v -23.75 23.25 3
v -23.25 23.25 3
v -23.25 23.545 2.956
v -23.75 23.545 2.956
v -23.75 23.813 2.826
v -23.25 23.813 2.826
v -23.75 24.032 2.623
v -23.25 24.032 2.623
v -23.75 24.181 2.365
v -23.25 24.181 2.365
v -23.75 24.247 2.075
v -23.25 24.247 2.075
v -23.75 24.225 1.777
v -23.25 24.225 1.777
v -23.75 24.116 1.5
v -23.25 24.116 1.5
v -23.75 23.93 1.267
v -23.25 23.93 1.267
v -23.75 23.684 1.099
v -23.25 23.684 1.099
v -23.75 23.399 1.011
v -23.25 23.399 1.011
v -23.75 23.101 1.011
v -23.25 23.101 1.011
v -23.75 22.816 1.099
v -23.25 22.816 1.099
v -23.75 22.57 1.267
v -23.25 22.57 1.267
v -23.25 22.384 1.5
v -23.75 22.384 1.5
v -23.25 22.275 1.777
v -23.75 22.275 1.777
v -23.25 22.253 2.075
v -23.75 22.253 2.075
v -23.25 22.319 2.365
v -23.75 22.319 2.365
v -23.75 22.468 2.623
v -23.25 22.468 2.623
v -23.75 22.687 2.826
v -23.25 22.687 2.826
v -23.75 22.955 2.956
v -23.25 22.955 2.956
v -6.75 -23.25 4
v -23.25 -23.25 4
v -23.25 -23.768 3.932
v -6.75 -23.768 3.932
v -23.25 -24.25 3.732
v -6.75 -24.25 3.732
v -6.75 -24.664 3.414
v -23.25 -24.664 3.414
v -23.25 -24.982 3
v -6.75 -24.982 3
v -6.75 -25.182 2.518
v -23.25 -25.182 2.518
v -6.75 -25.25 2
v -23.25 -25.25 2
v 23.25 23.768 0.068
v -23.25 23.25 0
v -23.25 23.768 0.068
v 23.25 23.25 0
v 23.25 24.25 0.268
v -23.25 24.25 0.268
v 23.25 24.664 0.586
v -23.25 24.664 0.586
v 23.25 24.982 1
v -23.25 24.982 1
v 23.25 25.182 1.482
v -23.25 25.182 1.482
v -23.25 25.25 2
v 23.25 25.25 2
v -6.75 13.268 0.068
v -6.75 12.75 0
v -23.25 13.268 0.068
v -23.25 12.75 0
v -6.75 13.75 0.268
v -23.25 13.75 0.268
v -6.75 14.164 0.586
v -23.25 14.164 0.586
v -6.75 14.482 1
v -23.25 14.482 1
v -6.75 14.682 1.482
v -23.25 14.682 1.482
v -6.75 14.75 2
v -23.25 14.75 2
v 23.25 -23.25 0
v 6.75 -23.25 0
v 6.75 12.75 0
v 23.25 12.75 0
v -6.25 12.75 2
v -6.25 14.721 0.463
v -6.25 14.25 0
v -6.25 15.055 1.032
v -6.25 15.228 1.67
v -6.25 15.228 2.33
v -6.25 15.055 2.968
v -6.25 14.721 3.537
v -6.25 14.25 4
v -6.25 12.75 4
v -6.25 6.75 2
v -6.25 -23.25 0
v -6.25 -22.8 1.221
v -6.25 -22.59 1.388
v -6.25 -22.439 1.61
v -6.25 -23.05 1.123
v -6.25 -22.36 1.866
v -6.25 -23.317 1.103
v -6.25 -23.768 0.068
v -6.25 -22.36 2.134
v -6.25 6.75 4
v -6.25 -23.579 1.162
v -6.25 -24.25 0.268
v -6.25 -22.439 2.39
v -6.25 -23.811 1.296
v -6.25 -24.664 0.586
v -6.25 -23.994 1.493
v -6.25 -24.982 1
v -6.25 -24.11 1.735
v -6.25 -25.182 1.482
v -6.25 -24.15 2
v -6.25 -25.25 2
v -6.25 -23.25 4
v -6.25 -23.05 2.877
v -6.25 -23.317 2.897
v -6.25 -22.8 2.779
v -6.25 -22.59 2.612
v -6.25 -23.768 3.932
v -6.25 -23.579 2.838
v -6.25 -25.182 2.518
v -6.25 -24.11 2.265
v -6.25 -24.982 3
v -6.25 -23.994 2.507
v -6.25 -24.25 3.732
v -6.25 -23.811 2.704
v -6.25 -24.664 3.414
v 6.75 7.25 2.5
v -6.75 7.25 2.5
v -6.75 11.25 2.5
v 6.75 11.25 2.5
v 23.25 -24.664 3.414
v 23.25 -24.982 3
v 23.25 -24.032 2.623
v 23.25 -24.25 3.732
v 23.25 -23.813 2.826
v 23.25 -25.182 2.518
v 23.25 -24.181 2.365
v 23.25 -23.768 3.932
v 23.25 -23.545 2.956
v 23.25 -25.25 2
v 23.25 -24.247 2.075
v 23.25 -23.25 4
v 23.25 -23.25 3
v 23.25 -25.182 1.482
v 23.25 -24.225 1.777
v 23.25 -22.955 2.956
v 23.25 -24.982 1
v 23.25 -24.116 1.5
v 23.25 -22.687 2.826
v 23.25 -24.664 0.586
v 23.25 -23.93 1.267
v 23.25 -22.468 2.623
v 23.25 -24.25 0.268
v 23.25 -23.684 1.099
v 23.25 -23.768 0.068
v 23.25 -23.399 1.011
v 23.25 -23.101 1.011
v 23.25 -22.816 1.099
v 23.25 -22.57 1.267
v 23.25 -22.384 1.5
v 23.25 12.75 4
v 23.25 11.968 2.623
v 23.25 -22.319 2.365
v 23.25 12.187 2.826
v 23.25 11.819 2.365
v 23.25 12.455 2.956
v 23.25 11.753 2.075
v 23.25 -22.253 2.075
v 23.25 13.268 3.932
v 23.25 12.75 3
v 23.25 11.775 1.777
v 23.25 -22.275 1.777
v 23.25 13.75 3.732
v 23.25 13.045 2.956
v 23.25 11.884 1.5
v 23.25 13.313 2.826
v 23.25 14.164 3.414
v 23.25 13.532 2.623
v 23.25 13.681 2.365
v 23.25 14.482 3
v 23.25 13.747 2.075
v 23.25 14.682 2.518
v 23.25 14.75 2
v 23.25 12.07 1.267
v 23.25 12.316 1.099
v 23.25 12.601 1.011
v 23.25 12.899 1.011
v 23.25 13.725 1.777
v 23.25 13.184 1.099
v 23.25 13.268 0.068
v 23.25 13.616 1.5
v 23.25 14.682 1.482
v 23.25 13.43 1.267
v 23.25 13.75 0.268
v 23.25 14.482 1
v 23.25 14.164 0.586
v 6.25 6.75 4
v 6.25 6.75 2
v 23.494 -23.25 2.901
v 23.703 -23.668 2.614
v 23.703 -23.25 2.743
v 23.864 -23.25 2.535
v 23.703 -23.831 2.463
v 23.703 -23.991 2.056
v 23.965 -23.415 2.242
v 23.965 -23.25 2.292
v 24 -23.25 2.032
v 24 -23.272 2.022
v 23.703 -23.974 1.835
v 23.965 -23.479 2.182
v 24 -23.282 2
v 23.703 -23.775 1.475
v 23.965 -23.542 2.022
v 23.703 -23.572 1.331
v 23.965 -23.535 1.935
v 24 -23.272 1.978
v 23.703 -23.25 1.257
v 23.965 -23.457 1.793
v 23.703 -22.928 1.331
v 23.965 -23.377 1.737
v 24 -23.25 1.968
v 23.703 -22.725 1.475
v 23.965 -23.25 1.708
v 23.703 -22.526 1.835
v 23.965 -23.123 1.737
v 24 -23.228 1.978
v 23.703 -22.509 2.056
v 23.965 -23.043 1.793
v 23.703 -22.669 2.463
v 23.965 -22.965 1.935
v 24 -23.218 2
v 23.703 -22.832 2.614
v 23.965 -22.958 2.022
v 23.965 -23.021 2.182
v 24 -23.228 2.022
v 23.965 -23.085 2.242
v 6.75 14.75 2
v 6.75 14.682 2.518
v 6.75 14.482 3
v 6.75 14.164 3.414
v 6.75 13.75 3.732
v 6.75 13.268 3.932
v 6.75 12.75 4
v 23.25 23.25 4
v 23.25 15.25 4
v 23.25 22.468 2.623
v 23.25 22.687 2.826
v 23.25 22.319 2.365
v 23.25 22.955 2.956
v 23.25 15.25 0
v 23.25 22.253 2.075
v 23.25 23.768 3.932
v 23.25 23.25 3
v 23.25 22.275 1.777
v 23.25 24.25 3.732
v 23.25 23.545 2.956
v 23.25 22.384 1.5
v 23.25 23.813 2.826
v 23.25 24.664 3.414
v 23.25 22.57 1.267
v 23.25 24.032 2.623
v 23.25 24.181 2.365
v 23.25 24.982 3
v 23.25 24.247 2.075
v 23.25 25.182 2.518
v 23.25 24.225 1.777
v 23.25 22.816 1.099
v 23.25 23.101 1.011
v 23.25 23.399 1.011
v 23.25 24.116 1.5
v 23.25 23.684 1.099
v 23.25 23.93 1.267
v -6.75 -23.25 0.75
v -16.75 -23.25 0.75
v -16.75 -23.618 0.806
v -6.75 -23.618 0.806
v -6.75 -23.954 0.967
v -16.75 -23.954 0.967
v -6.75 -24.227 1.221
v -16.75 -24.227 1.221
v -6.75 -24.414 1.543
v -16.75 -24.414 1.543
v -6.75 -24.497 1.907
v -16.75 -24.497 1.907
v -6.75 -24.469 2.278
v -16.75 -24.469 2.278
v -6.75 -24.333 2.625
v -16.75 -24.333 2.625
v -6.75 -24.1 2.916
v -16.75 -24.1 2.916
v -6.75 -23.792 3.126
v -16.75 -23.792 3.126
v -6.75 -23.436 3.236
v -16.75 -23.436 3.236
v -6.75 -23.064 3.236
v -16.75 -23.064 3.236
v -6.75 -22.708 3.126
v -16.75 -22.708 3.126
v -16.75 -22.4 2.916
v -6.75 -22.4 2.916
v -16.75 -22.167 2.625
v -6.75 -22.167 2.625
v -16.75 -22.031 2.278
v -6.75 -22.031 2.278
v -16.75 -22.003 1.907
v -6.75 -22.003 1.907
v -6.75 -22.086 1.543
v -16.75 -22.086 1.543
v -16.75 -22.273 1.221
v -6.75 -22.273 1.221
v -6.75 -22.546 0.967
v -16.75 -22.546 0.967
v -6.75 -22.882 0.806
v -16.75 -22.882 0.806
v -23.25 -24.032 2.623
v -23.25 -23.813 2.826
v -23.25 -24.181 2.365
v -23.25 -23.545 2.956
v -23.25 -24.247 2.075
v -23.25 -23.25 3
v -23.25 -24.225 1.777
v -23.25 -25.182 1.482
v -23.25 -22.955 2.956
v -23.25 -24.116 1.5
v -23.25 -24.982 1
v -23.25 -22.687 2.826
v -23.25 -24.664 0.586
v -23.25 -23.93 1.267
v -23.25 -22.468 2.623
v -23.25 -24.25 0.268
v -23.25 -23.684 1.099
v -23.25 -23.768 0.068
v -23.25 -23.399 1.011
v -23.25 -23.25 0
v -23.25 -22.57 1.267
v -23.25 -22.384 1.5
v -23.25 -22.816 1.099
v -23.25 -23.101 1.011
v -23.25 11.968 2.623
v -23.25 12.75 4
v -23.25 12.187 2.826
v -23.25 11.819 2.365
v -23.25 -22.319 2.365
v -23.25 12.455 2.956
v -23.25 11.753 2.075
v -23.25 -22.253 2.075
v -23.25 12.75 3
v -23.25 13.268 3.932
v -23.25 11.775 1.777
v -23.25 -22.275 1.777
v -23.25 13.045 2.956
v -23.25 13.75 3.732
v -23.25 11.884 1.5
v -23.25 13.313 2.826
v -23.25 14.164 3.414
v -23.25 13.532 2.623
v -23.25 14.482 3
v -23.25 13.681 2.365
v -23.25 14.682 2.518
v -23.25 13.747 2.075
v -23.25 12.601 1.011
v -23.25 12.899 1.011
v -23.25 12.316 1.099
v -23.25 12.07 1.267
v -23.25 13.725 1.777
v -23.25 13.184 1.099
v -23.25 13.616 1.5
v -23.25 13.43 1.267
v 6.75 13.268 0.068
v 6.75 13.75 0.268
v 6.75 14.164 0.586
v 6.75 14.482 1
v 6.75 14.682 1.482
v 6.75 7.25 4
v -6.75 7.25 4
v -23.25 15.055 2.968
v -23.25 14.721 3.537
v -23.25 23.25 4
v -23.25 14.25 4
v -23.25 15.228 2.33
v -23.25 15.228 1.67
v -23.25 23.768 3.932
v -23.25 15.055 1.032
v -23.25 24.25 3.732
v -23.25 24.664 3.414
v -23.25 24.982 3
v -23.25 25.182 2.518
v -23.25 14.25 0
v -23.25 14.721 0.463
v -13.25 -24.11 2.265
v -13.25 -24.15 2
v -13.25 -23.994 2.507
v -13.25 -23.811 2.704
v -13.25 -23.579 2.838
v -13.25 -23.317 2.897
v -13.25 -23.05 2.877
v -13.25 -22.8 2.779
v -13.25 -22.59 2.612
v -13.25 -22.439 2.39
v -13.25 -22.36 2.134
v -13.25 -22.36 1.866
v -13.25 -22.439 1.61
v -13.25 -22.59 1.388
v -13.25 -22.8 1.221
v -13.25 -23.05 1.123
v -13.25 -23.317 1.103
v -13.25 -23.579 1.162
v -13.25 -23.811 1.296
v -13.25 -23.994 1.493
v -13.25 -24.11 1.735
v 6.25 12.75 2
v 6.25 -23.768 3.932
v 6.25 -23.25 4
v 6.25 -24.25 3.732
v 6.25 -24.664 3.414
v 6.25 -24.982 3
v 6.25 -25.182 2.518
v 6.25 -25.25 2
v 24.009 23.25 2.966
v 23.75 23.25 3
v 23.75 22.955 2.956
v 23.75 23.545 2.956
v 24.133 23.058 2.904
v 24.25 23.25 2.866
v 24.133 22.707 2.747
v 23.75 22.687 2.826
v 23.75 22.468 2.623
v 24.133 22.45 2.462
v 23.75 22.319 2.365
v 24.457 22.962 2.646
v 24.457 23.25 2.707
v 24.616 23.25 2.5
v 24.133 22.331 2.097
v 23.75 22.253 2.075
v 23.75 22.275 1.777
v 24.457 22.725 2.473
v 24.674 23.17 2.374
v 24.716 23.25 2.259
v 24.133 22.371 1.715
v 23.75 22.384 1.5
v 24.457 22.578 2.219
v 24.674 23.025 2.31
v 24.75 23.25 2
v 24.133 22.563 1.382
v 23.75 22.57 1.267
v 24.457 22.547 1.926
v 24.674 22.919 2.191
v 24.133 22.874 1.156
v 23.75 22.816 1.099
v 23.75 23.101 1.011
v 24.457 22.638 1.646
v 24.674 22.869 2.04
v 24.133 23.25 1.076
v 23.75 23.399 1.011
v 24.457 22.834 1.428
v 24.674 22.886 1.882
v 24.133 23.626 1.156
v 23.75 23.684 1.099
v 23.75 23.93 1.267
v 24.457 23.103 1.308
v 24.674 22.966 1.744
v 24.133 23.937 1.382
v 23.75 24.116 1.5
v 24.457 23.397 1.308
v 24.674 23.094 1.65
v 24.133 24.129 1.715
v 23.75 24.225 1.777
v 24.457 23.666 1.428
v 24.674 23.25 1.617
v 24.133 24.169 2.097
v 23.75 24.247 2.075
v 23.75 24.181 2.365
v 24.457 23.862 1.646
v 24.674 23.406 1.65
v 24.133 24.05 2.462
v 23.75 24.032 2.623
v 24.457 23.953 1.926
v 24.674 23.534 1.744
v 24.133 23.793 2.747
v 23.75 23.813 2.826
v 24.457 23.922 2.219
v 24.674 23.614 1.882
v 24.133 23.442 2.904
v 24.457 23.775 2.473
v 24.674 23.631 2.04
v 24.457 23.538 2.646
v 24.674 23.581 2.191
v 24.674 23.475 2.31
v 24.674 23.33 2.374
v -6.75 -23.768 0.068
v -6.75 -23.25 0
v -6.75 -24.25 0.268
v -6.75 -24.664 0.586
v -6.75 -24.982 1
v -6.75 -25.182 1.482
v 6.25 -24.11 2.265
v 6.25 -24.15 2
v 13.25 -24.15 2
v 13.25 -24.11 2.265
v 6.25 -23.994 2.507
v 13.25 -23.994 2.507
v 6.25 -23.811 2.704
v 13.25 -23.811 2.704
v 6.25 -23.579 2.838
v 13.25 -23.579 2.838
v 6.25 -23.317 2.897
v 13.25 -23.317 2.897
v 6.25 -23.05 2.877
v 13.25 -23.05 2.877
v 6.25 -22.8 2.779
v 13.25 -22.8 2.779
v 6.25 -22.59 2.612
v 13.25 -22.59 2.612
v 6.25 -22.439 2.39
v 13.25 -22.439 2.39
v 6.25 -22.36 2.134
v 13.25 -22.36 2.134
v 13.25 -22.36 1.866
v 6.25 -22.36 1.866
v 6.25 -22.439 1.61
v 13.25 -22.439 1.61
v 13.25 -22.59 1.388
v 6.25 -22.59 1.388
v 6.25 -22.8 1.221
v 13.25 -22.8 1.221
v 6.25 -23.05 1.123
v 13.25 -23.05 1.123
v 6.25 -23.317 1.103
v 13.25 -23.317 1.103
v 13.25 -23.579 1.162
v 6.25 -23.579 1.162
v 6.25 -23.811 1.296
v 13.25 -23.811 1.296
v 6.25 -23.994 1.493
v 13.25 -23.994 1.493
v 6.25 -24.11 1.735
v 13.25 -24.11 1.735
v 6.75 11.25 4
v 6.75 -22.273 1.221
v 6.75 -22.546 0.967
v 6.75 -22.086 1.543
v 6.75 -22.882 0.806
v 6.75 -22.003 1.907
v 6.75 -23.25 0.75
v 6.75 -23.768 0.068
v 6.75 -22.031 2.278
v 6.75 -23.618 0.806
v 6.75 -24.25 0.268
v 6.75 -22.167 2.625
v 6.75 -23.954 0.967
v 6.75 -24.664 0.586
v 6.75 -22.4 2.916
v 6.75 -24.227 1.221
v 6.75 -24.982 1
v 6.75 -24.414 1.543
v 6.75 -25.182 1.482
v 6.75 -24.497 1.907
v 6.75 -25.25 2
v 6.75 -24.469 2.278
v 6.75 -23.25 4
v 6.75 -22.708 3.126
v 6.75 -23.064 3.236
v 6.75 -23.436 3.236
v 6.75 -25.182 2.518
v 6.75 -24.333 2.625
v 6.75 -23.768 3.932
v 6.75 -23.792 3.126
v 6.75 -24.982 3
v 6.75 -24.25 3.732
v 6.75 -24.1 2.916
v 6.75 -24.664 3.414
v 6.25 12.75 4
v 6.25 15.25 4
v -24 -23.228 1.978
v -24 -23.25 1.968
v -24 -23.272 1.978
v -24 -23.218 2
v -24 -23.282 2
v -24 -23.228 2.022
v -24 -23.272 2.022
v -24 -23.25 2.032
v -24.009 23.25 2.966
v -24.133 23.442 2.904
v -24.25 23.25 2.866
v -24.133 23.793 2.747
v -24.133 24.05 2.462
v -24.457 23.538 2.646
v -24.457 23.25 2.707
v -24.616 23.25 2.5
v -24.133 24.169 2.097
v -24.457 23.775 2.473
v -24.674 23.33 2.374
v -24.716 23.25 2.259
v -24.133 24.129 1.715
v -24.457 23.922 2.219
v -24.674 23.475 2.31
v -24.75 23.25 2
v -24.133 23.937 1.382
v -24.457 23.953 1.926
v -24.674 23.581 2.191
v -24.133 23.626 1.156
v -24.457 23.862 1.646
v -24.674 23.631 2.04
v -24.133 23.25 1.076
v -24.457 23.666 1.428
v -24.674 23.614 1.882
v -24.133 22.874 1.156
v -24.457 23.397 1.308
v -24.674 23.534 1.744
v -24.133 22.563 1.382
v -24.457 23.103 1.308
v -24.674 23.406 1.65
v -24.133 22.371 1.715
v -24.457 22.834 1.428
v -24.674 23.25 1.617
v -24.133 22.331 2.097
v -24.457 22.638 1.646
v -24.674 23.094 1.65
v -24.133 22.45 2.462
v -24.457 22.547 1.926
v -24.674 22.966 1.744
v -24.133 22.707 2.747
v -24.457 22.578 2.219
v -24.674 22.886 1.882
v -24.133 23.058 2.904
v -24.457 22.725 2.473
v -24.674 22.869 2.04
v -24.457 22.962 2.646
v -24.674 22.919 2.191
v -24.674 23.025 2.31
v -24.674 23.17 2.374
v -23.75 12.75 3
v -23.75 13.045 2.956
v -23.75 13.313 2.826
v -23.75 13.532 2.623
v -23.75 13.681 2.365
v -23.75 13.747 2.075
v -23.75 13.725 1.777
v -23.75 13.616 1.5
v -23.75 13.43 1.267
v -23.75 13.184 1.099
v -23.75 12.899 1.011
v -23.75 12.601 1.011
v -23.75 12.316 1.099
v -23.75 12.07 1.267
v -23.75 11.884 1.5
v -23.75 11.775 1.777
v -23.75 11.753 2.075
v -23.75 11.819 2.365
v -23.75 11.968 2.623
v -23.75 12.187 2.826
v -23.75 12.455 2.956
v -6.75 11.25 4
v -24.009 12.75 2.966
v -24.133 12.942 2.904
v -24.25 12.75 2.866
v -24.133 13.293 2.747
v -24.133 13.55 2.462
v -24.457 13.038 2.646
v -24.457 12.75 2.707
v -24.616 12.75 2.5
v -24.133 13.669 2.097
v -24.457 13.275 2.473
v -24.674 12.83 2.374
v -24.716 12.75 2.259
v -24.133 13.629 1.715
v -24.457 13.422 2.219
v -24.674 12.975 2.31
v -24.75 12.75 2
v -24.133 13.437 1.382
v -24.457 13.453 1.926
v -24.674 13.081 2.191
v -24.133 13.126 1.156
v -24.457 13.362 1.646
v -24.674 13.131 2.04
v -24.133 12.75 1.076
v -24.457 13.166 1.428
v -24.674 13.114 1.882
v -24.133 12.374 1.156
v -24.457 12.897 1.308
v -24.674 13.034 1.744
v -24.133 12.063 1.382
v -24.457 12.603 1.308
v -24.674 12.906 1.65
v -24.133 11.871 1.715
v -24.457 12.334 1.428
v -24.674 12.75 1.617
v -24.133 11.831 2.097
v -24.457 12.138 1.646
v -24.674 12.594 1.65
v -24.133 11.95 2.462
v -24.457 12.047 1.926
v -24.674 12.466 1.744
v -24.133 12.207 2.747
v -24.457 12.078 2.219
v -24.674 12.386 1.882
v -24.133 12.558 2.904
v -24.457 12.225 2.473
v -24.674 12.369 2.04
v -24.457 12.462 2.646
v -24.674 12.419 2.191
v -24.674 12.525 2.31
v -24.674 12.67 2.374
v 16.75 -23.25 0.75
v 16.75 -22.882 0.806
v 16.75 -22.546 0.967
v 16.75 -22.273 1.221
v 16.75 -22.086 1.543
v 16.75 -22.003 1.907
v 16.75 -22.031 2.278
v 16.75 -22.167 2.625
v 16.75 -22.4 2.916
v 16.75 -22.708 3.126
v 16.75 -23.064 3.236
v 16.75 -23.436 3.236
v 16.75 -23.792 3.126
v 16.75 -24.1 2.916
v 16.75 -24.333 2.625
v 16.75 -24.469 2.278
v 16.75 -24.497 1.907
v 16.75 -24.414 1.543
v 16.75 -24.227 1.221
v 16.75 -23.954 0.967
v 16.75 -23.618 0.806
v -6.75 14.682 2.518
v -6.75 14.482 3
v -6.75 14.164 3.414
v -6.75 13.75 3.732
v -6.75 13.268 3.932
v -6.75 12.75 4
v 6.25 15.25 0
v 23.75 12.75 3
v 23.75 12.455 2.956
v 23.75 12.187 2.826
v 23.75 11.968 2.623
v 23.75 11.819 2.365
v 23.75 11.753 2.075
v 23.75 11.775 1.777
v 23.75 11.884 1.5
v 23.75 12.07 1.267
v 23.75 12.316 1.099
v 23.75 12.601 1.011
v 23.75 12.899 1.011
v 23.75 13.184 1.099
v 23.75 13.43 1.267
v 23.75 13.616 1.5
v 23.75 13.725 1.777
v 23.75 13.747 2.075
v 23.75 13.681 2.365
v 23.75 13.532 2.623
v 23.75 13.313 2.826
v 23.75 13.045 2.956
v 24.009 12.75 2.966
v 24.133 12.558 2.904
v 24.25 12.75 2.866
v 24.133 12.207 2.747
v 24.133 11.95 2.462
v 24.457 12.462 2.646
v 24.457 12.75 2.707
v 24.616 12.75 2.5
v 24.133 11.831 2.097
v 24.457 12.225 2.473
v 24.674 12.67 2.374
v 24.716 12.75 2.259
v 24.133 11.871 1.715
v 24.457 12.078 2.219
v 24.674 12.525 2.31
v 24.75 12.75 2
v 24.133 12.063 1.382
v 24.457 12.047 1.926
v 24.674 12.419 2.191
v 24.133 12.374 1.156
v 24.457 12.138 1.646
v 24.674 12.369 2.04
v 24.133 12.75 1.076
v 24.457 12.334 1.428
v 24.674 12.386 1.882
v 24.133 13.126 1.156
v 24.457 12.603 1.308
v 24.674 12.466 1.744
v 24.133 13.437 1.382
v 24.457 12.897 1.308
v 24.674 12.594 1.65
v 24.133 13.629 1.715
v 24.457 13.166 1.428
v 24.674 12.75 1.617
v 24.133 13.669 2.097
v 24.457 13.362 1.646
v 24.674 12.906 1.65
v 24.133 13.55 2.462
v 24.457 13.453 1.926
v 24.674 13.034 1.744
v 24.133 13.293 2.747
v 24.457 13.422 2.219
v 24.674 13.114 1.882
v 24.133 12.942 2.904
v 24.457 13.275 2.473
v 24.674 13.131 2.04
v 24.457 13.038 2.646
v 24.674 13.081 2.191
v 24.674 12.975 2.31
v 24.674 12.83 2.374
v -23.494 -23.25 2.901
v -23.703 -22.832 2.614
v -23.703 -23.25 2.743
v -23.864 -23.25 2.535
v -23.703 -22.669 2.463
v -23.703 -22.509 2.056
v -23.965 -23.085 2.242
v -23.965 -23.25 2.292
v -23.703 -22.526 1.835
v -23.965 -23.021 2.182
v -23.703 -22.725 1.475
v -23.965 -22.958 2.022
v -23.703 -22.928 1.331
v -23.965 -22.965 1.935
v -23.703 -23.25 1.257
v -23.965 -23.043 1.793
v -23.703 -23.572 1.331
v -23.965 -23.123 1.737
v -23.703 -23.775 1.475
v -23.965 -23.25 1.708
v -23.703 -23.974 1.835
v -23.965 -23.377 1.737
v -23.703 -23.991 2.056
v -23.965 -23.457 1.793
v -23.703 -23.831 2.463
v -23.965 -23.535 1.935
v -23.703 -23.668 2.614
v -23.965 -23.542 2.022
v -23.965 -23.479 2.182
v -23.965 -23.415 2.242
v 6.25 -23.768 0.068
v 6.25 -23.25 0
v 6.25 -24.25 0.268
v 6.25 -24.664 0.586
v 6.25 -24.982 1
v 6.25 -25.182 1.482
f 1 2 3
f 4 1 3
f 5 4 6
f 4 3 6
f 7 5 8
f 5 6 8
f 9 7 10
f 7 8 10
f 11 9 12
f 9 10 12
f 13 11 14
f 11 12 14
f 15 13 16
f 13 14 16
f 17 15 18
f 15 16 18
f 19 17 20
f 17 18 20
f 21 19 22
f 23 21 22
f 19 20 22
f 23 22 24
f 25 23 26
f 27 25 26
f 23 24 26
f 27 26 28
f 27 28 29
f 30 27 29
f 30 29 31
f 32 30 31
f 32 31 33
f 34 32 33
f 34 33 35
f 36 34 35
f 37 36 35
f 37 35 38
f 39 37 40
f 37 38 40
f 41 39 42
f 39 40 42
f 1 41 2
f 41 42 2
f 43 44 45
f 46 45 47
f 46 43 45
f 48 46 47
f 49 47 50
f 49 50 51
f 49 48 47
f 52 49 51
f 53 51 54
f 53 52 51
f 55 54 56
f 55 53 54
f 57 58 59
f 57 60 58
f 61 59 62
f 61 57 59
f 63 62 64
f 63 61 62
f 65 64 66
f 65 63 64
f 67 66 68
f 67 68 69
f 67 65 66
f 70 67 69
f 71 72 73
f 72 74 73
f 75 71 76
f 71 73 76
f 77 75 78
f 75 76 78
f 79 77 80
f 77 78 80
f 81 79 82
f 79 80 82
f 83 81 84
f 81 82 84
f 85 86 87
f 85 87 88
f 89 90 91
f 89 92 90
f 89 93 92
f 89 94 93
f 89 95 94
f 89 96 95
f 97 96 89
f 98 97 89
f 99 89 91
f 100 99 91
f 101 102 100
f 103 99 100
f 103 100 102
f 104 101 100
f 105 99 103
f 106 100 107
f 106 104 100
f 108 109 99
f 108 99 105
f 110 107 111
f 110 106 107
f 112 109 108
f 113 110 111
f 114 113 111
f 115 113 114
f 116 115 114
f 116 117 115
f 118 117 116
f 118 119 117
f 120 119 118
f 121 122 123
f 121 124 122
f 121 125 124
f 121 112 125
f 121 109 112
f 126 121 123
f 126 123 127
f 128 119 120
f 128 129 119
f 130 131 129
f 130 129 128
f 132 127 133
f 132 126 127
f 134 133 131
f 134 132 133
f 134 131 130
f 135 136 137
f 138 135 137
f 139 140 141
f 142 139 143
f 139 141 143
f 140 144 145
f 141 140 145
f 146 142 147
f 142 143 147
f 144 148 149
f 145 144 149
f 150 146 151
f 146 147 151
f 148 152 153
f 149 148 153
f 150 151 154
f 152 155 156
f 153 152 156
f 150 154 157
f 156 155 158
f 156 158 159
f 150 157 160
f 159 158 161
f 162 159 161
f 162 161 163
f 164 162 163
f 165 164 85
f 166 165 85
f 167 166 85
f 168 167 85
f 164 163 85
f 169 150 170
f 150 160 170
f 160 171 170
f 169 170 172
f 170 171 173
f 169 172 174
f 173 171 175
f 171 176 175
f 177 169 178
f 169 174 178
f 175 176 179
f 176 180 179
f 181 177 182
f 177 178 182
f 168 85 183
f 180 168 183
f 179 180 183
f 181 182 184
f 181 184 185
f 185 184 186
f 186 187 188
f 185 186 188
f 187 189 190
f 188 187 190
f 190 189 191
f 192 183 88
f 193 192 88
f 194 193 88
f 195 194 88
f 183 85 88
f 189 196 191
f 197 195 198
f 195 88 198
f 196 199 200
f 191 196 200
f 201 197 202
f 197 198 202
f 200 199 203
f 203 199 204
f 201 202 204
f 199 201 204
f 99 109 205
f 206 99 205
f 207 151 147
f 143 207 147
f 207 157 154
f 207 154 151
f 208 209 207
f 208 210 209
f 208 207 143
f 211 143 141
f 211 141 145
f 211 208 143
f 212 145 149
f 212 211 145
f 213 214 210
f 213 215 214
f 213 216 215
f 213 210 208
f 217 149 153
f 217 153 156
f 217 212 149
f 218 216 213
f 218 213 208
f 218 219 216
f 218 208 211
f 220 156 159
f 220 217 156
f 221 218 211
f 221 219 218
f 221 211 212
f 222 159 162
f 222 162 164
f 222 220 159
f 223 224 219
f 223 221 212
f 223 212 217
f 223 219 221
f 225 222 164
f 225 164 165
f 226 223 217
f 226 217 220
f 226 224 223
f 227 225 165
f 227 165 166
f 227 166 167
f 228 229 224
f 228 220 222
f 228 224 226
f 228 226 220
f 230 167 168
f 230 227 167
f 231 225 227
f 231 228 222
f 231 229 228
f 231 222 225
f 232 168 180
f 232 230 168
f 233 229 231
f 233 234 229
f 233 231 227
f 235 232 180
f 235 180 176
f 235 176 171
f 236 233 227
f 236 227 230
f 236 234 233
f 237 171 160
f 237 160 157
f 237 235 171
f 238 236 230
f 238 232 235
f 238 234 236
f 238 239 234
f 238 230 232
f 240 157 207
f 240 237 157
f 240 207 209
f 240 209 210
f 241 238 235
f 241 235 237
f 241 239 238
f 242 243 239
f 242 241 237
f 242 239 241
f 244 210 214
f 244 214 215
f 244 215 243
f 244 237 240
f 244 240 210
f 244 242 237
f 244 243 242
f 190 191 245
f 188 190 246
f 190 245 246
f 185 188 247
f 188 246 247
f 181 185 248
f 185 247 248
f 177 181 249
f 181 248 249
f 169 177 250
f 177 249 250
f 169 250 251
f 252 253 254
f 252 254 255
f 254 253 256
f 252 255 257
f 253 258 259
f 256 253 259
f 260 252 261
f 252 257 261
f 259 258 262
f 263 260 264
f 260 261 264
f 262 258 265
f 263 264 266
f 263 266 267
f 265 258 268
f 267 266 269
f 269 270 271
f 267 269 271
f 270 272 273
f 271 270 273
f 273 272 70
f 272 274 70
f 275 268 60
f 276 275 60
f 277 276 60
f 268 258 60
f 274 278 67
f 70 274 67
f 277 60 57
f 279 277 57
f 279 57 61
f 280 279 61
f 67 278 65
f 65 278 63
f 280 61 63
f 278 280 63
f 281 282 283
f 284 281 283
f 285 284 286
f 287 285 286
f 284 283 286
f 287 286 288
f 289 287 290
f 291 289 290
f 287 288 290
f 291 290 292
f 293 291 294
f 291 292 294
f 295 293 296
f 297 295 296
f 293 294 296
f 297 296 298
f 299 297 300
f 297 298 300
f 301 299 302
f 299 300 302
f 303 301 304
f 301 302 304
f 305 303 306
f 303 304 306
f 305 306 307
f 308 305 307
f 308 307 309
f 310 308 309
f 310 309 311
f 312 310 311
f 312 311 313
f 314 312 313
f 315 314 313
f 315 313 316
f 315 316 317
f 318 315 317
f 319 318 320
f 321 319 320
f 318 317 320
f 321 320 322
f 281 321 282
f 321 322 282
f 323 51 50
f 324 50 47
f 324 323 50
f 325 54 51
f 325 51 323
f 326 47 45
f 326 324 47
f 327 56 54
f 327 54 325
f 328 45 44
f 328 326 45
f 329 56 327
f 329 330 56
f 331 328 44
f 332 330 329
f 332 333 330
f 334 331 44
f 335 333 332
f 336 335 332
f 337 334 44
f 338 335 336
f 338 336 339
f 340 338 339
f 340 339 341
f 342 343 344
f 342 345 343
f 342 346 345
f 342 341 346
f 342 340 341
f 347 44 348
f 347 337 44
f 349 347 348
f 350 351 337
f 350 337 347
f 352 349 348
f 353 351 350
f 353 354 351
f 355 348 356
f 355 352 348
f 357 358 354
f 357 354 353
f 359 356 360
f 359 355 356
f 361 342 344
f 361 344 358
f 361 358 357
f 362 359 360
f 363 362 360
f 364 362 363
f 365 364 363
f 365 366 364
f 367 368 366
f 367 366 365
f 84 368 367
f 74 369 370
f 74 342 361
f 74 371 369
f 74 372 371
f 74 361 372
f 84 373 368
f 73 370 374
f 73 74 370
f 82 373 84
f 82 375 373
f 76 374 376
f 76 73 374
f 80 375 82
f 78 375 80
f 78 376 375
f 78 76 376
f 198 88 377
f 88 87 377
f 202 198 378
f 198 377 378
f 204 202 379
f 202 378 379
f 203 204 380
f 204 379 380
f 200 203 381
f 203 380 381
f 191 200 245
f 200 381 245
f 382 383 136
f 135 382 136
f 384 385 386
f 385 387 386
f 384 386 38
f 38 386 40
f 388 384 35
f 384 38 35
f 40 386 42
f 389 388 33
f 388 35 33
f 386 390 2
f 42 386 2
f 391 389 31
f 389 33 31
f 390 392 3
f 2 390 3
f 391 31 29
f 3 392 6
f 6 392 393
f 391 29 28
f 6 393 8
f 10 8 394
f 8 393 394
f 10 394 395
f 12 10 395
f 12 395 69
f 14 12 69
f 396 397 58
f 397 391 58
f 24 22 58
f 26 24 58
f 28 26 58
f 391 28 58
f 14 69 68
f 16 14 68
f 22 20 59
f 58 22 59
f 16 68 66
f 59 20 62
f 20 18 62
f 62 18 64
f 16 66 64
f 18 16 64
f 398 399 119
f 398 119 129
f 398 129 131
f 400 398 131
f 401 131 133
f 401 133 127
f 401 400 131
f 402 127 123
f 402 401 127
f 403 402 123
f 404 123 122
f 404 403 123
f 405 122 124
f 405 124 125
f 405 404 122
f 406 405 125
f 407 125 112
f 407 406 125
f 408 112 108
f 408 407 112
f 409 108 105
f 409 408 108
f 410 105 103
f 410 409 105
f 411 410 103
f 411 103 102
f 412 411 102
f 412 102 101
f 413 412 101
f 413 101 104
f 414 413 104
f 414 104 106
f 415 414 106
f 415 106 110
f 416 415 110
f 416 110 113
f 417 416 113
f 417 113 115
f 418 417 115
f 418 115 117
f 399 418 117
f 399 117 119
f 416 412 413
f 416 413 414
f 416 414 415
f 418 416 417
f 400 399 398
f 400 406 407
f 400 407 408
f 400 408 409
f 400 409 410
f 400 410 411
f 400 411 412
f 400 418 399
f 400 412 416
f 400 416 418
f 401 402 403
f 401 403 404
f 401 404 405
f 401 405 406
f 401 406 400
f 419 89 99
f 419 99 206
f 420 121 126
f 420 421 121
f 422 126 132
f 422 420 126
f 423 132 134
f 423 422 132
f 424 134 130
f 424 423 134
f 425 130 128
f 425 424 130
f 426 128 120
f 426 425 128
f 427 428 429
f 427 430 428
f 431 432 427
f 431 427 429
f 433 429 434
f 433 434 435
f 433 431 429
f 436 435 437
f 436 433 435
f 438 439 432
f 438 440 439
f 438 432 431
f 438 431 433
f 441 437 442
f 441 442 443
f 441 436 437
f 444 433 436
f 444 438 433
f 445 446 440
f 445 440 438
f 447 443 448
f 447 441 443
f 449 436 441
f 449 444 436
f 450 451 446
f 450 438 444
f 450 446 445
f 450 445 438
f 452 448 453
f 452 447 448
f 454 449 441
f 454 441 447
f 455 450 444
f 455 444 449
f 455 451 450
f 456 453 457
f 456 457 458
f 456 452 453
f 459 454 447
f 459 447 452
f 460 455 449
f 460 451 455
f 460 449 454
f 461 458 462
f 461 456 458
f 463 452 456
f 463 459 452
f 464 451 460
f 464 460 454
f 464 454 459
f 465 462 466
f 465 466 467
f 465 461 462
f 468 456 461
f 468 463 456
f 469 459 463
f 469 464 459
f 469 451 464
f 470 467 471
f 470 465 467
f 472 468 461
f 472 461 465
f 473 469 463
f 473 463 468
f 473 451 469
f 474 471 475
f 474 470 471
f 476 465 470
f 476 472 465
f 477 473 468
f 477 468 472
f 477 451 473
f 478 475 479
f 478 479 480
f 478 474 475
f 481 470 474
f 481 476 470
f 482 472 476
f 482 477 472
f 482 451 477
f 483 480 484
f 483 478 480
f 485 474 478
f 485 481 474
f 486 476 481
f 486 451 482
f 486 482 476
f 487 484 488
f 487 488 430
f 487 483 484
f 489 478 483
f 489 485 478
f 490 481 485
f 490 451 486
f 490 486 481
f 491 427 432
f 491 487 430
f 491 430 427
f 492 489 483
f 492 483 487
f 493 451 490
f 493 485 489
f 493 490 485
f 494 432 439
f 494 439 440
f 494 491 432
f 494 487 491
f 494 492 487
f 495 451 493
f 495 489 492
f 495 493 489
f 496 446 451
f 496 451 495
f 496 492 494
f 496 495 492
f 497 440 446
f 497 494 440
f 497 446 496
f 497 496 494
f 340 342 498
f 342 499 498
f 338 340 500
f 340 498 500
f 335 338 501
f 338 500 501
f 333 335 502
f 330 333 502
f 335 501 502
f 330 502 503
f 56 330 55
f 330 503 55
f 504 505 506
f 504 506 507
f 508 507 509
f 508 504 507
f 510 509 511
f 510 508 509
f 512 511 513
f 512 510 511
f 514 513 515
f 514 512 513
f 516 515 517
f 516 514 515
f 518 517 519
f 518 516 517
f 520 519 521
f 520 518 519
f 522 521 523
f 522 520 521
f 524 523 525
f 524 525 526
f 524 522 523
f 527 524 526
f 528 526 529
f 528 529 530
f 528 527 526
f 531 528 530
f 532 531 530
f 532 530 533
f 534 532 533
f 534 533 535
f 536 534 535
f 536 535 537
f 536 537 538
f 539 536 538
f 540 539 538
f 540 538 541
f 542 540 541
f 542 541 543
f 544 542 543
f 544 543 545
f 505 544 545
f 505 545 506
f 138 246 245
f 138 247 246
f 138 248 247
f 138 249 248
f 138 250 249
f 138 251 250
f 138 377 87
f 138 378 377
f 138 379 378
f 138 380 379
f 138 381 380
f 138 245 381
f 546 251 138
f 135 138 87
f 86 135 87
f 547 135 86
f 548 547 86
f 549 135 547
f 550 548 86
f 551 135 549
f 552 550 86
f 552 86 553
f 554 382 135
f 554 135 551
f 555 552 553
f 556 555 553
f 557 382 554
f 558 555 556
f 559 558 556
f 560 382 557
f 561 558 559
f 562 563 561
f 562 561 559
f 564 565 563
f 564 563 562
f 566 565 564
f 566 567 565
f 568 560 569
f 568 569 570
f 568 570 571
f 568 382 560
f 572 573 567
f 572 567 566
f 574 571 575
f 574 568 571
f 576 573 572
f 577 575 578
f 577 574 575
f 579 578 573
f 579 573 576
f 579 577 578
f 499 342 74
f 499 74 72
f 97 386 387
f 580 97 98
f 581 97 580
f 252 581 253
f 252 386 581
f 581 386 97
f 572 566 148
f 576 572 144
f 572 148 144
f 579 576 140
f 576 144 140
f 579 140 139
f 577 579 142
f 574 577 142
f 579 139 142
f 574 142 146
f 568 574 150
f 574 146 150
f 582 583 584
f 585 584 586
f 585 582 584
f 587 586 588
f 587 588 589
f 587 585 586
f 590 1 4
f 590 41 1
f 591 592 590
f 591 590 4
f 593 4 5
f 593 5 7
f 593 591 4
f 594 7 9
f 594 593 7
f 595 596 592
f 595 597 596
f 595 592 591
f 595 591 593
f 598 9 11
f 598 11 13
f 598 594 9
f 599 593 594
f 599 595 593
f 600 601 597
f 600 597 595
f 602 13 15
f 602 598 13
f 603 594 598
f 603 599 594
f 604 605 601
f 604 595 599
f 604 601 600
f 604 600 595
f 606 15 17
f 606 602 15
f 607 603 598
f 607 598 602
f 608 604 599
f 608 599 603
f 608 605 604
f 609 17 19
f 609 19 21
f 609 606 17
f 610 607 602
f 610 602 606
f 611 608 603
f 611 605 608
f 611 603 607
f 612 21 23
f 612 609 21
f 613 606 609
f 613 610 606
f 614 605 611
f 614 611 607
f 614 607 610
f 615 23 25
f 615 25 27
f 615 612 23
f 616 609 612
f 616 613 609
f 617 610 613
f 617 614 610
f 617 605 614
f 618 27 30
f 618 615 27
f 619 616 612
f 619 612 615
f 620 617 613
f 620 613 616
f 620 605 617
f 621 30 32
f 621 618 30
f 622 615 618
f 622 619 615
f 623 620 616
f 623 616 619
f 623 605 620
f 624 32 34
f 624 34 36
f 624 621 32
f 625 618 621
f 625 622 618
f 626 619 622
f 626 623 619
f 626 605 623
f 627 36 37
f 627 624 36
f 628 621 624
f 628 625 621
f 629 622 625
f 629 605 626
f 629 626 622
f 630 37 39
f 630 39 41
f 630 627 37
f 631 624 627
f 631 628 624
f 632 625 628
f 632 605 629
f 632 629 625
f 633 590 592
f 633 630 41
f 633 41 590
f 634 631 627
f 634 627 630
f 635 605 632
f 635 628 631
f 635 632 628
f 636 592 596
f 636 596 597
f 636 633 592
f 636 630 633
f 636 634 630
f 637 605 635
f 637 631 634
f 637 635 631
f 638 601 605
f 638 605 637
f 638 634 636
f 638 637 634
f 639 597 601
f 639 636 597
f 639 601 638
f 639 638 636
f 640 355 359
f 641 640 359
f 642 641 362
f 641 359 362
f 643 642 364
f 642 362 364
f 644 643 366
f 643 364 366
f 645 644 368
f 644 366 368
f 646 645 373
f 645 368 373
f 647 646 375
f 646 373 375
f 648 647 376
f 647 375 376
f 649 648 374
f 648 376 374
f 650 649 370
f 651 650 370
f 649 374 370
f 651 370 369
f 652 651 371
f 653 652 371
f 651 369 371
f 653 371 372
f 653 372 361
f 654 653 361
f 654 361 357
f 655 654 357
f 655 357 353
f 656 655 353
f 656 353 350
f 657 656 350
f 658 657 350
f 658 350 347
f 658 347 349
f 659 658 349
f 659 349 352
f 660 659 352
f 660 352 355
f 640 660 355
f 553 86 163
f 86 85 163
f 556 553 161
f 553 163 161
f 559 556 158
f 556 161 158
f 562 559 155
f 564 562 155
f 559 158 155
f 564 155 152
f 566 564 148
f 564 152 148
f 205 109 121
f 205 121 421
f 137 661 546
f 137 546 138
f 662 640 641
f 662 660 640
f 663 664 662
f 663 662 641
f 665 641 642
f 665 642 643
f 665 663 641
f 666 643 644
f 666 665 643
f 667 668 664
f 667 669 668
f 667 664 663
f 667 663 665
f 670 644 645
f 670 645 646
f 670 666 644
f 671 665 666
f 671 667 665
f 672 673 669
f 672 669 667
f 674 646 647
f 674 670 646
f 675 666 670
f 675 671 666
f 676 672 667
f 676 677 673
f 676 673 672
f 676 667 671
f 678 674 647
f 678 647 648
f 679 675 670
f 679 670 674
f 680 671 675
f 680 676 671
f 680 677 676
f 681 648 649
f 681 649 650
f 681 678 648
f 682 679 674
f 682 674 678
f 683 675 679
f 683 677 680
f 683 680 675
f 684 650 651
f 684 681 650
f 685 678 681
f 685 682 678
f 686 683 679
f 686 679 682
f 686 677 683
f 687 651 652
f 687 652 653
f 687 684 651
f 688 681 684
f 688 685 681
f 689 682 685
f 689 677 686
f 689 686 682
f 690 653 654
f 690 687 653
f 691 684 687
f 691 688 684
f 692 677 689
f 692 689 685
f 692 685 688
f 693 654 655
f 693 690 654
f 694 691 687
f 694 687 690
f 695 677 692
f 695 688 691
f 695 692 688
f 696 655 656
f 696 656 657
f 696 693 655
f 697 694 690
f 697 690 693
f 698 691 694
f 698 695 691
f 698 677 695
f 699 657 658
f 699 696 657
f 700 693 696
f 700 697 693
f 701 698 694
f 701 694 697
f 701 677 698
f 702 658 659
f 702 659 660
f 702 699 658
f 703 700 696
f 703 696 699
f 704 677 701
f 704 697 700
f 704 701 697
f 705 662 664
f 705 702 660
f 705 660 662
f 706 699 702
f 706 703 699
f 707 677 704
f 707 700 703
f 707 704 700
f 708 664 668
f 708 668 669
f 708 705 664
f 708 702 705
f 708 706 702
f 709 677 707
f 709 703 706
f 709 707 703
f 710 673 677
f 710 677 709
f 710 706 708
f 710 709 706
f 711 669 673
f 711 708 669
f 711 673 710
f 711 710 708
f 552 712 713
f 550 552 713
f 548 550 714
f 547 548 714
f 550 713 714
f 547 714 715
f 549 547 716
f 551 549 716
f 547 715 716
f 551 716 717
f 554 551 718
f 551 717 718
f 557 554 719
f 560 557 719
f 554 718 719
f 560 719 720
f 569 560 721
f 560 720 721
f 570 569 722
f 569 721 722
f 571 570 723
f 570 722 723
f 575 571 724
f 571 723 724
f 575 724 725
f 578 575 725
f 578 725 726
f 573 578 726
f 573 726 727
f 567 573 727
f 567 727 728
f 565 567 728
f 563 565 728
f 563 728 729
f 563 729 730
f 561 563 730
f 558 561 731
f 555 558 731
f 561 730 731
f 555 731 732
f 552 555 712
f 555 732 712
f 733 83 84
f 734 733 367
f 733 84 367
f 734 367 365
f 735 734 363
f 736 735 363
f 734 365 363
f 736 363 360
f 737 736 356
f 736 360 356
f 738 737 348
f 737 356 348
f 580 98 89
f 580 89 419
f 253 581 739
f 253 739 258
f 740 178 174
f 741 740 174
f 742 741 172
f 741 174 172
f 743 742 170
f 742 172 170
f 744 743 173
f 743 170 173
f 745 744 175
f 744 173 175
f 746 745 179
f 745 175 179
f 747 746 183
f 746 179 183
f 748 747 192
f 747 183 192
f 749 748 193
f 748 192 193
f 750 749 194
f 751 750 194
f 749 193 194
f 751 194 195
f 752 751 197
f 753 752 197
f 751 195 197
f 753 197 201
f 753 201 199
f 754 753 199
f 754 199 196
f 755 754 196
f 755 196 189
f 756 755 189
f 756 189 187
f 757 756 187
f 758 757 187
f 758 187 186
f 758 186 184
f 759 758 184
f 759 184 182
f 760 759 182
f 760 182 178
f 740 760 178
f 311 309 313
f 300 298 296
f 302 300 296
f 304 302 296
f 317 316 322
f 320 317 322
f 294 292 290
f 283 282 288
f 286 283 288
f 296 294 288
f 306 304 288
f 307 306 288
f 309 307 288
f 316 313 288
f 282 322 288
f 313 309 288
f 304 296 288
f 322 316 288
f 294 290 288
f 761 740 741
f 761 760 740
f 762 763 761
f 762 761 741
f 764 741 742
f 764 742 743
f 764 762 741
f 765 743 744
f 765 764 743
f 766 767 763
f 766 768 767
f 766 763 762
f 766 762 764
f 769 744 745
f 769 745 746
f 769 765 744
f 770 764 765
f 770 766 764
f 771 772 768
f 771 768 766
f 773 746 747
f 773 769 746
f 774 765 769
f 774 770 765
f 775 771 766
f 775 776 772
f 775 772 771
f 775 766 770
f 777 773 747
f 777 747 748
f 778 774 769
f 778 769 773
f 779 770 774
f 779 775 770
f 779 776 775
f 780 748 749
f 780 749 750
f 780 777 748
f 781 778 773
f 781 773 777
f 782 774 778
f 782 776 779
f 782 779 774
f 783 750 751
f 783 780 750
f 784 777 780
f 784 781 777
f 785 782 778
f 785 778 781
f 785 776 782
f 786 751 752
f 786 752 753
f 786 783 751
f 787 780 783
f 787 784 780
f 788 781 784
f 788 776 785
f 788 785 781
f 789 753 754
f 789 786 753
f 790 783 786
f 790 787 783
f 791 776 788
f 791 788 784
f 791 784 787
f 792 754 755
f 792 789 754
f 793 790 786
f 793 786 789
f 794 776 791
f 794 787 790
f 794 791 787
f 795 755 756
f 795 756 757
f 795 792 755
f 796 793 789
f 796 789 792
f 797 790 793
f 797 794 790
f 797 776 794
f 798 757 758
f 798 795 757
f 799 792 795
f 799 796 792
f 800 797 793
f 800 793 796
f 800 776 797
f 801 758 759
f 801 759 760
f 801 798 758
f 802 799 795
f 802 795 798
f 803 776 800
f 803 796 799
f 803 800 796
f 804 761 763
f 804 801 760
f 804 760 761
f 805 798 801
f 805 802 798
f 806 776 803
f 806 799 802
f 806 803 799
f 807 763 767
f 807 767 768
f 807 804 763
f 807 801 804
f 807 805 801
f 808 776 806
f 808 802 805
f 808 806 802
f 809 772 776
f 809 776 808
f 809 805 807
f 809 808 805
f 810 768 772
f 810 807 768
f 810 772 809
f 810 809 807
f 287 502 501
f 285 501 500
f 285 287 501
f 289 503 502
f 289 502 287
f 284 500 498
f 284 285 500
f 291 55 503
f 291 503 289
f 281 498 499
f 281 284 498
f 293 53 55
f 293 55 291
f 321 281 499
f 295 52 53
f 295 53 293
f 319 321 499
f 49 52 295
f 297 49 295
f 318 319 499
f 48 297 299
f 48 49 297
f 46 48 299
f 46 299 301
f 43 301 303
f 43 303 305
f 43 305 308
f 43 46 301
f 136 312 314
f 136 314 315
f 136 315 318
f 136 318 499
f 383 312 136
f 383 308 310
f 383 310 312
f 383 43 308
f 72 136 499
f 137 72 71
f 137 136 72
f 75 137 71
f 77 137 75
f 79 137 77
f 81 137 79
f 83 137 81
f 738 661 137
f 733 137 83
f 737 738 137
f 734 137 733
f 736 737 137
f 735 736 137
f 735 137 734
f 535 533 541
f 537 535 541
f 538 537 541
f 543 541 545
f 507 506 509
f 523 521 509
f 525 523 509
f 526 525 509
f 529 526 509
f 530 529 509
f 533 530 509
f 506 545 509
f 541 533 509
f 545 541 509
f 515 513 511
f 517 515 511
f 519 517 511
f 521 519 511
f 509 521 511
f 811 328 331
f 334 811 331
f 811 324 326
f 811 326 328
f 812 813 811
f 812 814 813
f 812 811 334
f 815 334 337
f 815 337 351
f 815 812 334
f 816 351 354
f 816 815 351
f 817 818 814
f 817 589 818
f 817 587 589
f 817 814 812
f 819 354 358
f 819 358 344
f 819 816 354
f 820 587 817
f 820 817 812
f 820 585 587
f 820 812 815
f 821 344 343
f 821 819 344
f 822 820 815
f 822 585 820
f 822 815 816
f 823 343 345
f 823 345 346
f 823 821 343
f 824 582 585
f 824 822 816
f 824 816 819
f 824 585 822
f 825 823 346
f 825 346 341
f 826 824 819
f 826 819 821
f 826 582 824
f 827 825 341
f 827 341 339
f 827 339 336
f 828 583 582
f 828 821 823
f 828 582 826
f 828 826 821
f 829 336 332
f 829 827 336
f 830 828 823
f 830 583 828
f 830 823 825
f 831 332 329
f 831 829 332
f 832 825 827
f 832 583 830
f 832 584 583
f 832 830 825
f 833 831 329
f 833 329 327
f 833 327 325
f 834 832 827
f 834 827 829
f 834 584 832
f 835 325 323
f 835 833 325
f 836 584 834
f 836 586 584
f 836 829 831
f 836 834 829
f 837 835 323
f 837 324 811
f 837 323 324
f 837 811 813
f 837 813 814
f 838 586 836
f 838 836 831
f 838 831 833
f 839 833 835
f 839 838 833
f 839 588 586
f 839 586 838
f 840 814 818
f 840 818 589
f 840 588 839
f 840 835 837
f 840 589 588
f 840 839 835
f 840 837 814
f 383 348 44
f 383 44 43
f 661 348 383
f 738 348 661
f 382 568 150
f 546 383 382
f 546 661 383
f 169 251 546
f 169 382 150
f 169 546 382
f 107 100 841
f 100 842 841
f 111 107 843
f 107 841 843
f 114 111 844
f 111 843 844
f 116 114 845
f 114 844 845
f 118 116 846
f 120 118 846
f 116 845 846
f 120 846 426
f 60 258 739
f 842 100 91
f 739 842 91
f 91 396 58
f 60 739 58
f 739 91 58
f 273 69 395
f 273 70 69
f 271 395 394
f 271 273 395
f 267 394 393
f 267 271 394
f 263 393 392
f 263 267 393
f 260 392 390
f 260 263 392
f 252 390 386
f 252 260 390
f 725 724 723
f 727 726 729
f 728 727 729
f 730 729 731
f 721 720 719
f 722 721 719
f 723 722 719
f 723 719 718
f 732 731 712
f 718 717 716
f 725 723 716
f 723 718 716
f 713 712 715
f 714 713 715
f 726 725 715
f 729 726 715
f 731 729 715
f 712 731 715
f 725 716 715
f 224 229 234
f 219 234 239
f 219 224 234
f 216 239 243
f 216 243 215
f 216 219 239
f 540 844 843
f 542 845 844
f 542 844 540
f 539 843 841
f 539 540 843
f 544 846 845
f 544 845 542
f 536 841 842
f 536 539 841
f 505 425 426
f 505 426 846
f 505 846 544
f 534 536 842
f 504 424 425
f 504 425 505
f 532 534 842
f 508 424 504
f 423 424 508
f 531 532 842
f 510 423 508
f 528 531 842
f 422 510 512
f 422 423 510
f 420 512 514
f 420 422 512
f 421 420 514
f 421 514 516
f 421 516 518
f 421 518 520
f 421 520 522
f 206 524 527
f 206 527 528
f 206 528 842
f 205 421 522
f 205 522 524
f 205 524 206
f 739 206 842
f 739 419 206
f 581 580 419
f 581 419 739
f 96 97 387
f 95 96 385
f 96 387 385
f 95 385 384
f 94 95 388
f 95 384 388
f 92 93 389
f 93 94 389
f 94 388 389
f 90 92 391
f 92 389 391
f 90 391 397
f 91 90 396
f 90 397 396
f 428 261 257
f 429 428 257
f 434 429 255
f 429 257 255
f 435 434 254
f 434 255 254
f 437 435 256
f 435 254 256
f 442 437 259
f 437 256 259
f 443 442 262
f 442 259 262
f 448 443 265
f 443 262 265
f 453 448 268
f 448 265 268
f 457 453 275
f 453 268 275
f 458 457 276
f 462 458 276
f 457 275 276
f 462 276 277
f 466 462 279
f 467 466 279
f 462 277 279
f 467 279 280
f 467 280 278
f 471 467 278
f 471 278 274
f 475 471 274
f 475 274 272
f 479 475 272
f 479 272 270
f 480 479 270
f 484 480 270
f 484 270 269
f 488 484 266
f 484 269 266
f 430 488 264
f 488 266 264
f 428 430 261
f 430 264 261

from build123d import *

# Parameters (mm, degrees)
SKETCH1_W             = 46.5
SKETCH1_H             = 50.5
BODY_DEPTH            = 4
BODY_CUT_DEPTH        = 4
FILLET1_R             = 2
FILLET2_R             = 2
FILLET3_R             = 2
HINGE_HOLE_L_START    = -6.5
SKETCH4_R             = 1.25
HINGE_HOLE_L_DEPTH    = 10
HINGE_HOLE_R_START    = -6.5
SKETCH8_R             = 1.25
HINGE_HOLE_R_DEPTH    = 10
HINGE_ROD_START       = 7
SKETCH7_R             = 0.9
HINGE_ROD_DEPTH       = 26.5
SKETCH9_W             = 12.5
SKETCH9_H             = 6
CONN_CUT_DEPTH        = 2
SKETCH10_W            = 1.5
SKETCH10_H            = 4
CONN_PIECE_DEPTH      = 13.5
SKETCH12_R            = 1
BUMPS_L_DEPTH         = 1.5
SKETCH13_R            = 1
BUMPS_R_DEPTH         = 1.5
SKETCH14_R            = 1
MINI_BUMP_L_DEPTH     = 0.75
SKETCH15_R            = 1
MINI_BUMP_R_DEPTH     = 0.75
FILLET6_R             = 1
FILLET7_R             = 1
FILLET8_R             = 1
HOOK_MATERIAL_R_DEPTH = 17


# Some blends are built 0.0001 mm under size
with BuildPart() as part:
    # Sketch1 → body (new body)
    with BuildSketch(Plane.XY):
        Rectangle(SKETCH1_W, SKETCH1_H)
    extrude(amount=BODY_DEPTH)

    # Sketch2 → body_cut (cut)
    with BuildSketch(Plane.XY.offset(4)):
        Polygon((-23.25, 15.25), (-6.25, 15.25), (-6.25, -25.25), (-6.75, -25.25), (-6.75, 14.75), (-23.25, 14.75), align=None)
        Polygon((6.25, 15.25), (23.25, 15.25), (23.25, 14.75), (6.75, 14.75), (6.75, -25.25), (6.25, -25.25), align=None)
    extrude(amount=-BODY_CUT_DEPTH, mode=Mode.SUBTRACT)


with BuildPart() as body_cut_piece_1:
    # of the separate pieces the step leaves, piece 1, a body of its own (body_cut_pieces)
    add(part.part.solids().sort_by_distance((6.25, -25.25, 0))[0])

    # Fillet3
    fillet3_edges = [body_cut_piece_1.edges().sort_by_distance(p)[0] for p in [
        (0, 25.25, 0),
        (0, 25.25, 4),
        (0, -25.25, 0),
        (0, -25.25, 4),
    ]]
    fillet(fillet3_edges, radius=FILLET3_R - 0.0001)  # a hair under: the kernel refuses the full size

    # Sketch7 → hinge_rod (add)
    with BuildSketch(Plane.ZY.offset(6.25).offset(HINGE_ROD_START)):
        with Locations(Location((2, -23.25, 0), (0, 0, 270))):
            Circle(SKETCH7_R)
    extrude(amount=-HINGE_ROD_DEPTH)

    # Sketch9 → conn_cut (cut)
    with BuildSketch(Plane.XY.offset(4)):
        with Locations((0, 9.75)):
            Rectangle(SKETCH9_W, SKETCH9_H)
    extrude(amount=-CONN_CUT_DEPTH, mode=Mode.SUBTRACT)



with BuildPart() as body_cut_piece_2:
    # of the separate pieces the step leaves, piece 2, a body of its own (body_cut_pieces)
    add(part.part.solids().sort_by_distance((-6.75, -25.25, 0))[0])

    # Fillet1
    fillet1_edges = [body_cut_piece_2.edges().sort_by_distance(p)[0] for p in [
        (-15, -25.25, 0),
        (-15, -25.25, 4),
        (-15, 14.75, 4),
        (-15, 14.75, 0),
    ]]
    fillet(fillet1_edges, radius=FILLET1_R - 0.0001)  # a hair under: the kernel refuses the full size

    # Sketch8 → hinge_hole_r (cut)
    with BuildSketch(Plane.ZY.offset(23.25).offset(HINGE_HOLE_R_START)):
        with Locations(Location((2, -23.25, 0), (0, 0, 180))):
            Circle(SKETCH8_R)
    extrude(amount=-HINGE_HOLE_R_DEPTH, mode=Mode.SUBTRACT)



with BuildPart() as body_cut_piece_3:
    # of the separate pieces the step leaves, piece 3, a body of its own (body_cut_pieces)
    add(part.part.solids().sort_by_distance((23.25, -25.25, 0))[0])

    # Fillet2
    fillet2_edges = [body_cut_piece_3.edges().sort_by_distance(p)[0] for p in [
        (15, 14.75, 0),
        (15, -25.25, 0),
        (15, -25.25, 4),
        (15, 14.75, 4),
    ]]
    fillet(fillet2_edges, radius=FILLET2_R - 0.0001)  # a hair under: the kernel refuses the full size

    # Sketch4 → hinge_hole_l (cut)
    with BuildSketch(Plane(origin=(23.25, 0, 0), x_dir=(0, 0, -1), z_dir=(1, 0, 0)).offset(HINGE_HOLE_L_START)):
        with Locations((-2, -23.25)):
            Circle(SKETCH4_R)
    extrude(amount=-HINGE_HOLE_L_DEPTH, mode=Mode.SUBTRACT)


with BuildPart() as body_cut_piece_2_1:
    add(body_cut_piece_2.part)

    add(body_cut_piece_3.part)  # conn_piece merges body_cut piece 3
    # Sketch10 → conn_piece (add)
    with BuildSketch(Plane(origin=(-6.75, 0, 0), x_dir=(0, 0, -1), z_dir=(1, 0, 0))):
        with Locations((-3.25, 9.25)):
            Rectangle(SKETCH10_W, SKETCH10_H)
    extrude(amount=CONN_PIECE_DEPTH)


with BuildPart() as body_cut_piece_1_1:
    add(body_cut_piece_1.part)

    add(body_cut_piece_2_1.part)  # bumps_l merges body_cut piece 2
    # Sketch12 → bumps_l (add)
    with BuildSketch(Plane(origin=(23.25, 0, 0), x_dir=(0, 0, -1), z_dir=(1, 0, 0))):
        with Locations(Location((-2, 23.25, 0), (0, 0, 180))):
            Circle(SKETCH12_R)
        with Locations(Location((-2, 12.75, 0), (0, 0, 180))):
            Circle(SKETCH12_R)
    extrude(amount=BUMPS_L_DEPTH)

    # Sketch13 → bumps_r (add)
    with BuildSketch(Plane.ZY.offset(23.25)):
        with Locations((2, 23.25)):
            Circle(SKETCH13_R)
        with Locations((2, 12.75)):
            Circle(SKETCH13_R)
    extrude(amount=BUMPS_R_DEPTH)

    # Sketch14 → mini_bump_l (add)
    with BuildSketch(Plane(origin=(23.25, 0, 0), x_dir=(0, 0, -1), z_dir=(1, 0, 0))):
        with Locations(Location((-2, -23.25, 0), (0, 0, 180))):
            Circle(SKETCH14_R)
    extrude(amount=MINI_BUMP_L_DEPTH)

    # Sketch15 → mini_bump_r (add)
    with BuildSketch(Plane.ZY.offset(23.25)):
        with Locations((2, -23.25)):
            Circle(SKETCH15_R)
    extrude(amount=MINI_BUMP_R_DEPTH)

    # Fillet6
    fillet6_edges = [body_cut_piece_1_1.edges().sort_by_distance(p)[0] for p in [
        (24.75, 23.25, 1),
        (-24.75, 23.25, 1),
    ]]
    fillet(fillet6_edges, radius=FILLET6_R)

    # Fillet7
    # the kernel refuses this fillet: 1 mm, written as the material it takes off along each edge
    with BuildSketch(Plane(origin=(-24.75, 12.75, 2), x_dir=(0, 0, 1), z_dir=(0, -1, 0))) as fillet7_piece_1:
        with BuildLine():
            CenterArc((1 - FILLET7_R, -FILLET7_R), FILLET7_R, 0, 90)
            Line((1 - FILLET7_R, 0), (1 - FILLET7_R, FILLET7_R * 0.02))
            Line((1 - FILLET7_R, FILLET7_R * 0.02), (1, FILLET7_R * 0.02))
            Line((1, FILLET7_R * 0.02), (1 + FILLET7_R * 0.02, 0))
            Line((1 + FILLET7_R * 0.02, 0), (1 + FILLET7_R * 0.02, -FILLET7_R))
            Line((1 + FILLET7_R * 0.02, -FILLET7_R), (1, -FILLET7_R))
        make_face()
    revolve(axis=Axis((-24.75, 12.75, 2), (-1, 0, 0)), mode=Mode.SUBTRACT)
    with BuildSketch(Plane(origin=(-24, -23.25, 2), x_dir=(0, 0, 1), z_dir=(0, -1, 0))) as fillet7_piece_2:
        with BuildLine():
            CenterArc((0.031754163, -1), FILLET7_R, 14.477512186, 75.522487814)
            Line((0.031754163, 0), (0.031754163, 0.02))
            Line((0.031754163, 0.02), (1, 0.02))
            Line((1, 0.02), (1.02, 0))
            ThreePointArc((1.02, 0), (1.02, -0.375), (1.019364917, -0.745))
            Line((1.019364917, -0.745), (1, -0.75))
        make_face()
    revolve(axis=Axis((-24, -23.25, 2), (-1, 0, 0)), mode=Mode.SUBTRACT)

    # Fillet8
    # the kernel refuses this fillet: 1 mm, written as the material it takes off along each edge
    with BuildSketch(Plane(origin=(24.75, 12.75, 2), x_dir=(0, 0, 1), z_dir=(0, 1, 0))) as fillet8_piece_1:
        with BuildLine():
            CenterArc((1 - FILLET8_R, -FILLET8_R), FILLET8_R, 0, 90)
            Line((1 - FILLET8_R, 0), (1 - FILLET8_R, FILLET8_R * 0.02))
            Line((1 - FILLET8_R, FILLET8_R * 0.02), (1, FILLET8_R * 0.02))
            Line((1, FILLET8_R * 0.02), (1 + FILLET8_R * 0.02, 0))
            Line((1 + FILLET8_R * 0.02, 0), (1 + FILLET8_R * 0.02, -FILLET8_R))
            Line((1 + FILLET8_R * 0.02, -FILLET8_R), (1, -FILLET8_R))
        make_face()
    revolve(axis=Axis((24.75, 12.75, 2), (1, 0, 0)), mode=Mode.SUBTRACT)
    with BuildSketch(Plane(origin=(24, -23.25, 2), x_dir=(0, 0, 1), z_dir=(0, 1, 0))) as fillet8_piece_2:
        with BuildLine():
            CenterArc((0.031754163, -1), FILLET8_R, 14.477512186, 75.522487814)
            Line((0.031754163, 0), (0.031754163, 0.02))
            Line((0.031754163, 0.02), (1, 0.02))
            Line((1, 0.02), (1.02, 0))
            ThreePointArc((1.02, 0), (1.02, -0.375), (1.019364917, -0.745))
            Line((1.019364917, -0.745), (1, -0.75))
        make_face()
    revolve(axis=Axis((24, -23.25, 2), (1, 0, 0)), mode=Mode.SUBTRACT)

    # Sketch16 → hook_material_r (add)
    with BuildSketch(Plane.ZY.offset(23.25)):
        with BuildLine():
            Line((0, 14.25), (0, 15.75))
            Line((0, 15.75), (4, 15.75))
            Line((4, 15.75), (4, 14.25))
            ThreePointArc((4, 14.25), (2, 15.25), (0, 14.25))
        make_face()
    extrude(amount=-HOOK_MATERIAL_R_DEPTH)


solid = body_cut_piece_1_1.part
